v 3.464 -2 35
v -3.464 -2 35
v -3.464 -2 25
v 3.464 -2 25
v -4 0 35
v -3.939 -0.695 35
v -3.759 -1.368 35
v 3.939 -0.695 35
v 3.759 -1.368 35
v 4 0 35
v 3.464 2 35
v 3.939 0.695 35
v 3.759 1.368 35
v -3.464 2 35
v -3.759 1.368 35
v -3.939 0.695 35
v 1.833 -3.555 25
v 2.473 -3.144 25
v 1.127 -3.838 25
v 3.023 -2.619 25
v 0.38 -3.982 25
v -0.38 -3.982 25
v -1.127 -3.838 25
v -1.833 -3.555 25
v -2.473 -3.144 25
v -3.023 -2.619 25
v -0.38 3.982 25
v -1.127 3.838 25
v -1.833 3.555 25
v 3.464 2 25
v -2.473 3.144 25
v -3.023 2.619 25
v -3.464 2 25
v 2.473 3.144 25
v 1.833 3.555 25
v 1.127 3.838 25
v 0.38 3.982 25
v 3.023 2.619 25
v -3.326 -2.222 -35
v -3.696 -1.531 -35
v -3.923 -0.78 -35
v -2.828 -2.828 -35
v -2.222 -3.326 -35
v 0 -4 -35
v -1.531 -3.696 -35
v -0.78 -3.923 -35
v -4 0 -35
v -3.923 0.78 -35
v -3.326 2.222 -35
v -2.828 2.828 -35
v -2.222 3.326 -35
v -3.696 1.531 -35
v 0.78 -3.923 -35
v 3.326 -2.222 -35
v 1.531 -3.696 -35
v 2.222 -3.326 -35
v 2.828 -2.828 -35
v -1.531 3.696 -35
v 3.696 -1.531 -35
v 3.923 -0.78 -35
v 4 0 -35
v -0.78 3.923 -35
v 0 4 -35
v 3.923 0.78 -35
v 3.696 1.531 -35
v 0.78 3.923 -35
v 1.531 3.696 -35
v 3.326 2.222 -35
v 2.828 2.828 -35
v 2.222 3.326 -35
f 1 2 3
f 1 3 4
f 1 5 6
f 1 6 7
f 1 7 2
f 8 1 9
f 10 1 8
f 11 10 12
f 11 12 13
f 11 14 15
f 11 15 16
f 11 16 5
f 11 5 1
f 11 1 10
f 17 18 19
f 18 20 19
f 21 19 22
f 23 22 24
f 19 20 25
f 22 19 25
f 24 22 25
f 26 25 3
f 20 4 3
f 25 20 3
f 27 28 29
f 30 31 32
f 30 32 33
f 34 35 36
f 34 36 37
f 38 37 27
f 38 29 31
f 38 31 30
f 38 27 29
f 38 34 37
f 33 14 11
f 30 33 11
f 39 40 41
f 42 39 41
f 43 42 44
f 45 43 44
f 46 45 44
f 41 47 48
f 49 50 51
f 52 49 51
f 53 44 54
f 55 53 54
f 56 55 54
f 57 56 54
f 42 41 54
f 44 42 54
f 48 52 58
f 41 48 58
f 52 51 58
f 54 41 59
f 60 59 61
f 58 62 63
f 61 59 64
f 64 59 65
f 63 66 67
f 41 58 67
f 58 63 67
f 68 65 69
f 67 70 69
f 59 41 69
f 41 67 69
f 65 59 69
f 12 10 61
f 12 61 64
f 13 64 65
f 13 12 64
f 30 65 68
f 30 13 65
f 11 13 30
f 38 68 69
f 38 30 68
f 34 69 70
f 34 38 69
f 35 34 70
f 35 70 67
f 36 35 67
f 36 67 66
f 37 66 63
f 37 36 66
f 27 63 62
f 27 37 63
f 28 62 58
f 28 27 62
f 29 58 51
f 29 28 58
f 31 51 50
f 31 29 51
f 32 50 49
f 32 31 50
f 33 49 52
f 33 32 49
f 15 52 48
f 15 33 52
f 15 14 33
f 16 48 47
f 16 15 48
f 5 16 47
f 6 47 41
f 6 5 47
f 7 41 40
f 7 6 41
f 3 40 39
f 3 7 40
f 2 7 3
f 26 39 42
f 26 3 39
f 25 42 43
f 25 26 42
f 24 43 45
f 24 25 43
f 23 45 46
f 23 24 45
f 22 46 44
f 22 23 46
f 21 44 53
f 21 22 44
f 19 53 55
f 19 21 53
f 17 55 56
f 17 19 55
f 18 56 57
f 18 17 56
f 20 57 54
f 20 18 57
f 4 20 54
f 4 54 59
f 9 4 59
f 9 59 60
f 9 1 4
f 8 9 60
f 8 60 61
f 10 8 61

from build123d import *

# Parameters (mm, degrees)
SKETCH1_R           = 4
BOSS_EXTRUDE1_DEPTH = 35
SKETCH2_W           = 8
SKETCH2_H           = 2.52995071
CUT_EXTRUDE1_DEPTH  = 10


with BuildPart() as part:
    # Sketch1 → Boss-Extrude1 (new body, symmetric)
    with BuildSketch(Plane.XY):
        Circle(SKETCH1_R)
    extrude(amount=BOSS_EXTRUDE1_DEPTH, both=True)

    # Sketch2 → Cut-Extrude1 (cut)
    with BuildSketch(Plane.XY.offset(35)):
        Polygon((-4, -2), (4, -2), (4, -4.561964496), (-4, -4.711362164), align=None)
        with Locations((0, 3.264975355)):
            Rectangle(SKETCH2_W, SKETCH2_H)
    extrude(amount=-CUT_EXTRUDE1_DEPTH, mode=Mode.SUBTRACT)


solid = part.part
